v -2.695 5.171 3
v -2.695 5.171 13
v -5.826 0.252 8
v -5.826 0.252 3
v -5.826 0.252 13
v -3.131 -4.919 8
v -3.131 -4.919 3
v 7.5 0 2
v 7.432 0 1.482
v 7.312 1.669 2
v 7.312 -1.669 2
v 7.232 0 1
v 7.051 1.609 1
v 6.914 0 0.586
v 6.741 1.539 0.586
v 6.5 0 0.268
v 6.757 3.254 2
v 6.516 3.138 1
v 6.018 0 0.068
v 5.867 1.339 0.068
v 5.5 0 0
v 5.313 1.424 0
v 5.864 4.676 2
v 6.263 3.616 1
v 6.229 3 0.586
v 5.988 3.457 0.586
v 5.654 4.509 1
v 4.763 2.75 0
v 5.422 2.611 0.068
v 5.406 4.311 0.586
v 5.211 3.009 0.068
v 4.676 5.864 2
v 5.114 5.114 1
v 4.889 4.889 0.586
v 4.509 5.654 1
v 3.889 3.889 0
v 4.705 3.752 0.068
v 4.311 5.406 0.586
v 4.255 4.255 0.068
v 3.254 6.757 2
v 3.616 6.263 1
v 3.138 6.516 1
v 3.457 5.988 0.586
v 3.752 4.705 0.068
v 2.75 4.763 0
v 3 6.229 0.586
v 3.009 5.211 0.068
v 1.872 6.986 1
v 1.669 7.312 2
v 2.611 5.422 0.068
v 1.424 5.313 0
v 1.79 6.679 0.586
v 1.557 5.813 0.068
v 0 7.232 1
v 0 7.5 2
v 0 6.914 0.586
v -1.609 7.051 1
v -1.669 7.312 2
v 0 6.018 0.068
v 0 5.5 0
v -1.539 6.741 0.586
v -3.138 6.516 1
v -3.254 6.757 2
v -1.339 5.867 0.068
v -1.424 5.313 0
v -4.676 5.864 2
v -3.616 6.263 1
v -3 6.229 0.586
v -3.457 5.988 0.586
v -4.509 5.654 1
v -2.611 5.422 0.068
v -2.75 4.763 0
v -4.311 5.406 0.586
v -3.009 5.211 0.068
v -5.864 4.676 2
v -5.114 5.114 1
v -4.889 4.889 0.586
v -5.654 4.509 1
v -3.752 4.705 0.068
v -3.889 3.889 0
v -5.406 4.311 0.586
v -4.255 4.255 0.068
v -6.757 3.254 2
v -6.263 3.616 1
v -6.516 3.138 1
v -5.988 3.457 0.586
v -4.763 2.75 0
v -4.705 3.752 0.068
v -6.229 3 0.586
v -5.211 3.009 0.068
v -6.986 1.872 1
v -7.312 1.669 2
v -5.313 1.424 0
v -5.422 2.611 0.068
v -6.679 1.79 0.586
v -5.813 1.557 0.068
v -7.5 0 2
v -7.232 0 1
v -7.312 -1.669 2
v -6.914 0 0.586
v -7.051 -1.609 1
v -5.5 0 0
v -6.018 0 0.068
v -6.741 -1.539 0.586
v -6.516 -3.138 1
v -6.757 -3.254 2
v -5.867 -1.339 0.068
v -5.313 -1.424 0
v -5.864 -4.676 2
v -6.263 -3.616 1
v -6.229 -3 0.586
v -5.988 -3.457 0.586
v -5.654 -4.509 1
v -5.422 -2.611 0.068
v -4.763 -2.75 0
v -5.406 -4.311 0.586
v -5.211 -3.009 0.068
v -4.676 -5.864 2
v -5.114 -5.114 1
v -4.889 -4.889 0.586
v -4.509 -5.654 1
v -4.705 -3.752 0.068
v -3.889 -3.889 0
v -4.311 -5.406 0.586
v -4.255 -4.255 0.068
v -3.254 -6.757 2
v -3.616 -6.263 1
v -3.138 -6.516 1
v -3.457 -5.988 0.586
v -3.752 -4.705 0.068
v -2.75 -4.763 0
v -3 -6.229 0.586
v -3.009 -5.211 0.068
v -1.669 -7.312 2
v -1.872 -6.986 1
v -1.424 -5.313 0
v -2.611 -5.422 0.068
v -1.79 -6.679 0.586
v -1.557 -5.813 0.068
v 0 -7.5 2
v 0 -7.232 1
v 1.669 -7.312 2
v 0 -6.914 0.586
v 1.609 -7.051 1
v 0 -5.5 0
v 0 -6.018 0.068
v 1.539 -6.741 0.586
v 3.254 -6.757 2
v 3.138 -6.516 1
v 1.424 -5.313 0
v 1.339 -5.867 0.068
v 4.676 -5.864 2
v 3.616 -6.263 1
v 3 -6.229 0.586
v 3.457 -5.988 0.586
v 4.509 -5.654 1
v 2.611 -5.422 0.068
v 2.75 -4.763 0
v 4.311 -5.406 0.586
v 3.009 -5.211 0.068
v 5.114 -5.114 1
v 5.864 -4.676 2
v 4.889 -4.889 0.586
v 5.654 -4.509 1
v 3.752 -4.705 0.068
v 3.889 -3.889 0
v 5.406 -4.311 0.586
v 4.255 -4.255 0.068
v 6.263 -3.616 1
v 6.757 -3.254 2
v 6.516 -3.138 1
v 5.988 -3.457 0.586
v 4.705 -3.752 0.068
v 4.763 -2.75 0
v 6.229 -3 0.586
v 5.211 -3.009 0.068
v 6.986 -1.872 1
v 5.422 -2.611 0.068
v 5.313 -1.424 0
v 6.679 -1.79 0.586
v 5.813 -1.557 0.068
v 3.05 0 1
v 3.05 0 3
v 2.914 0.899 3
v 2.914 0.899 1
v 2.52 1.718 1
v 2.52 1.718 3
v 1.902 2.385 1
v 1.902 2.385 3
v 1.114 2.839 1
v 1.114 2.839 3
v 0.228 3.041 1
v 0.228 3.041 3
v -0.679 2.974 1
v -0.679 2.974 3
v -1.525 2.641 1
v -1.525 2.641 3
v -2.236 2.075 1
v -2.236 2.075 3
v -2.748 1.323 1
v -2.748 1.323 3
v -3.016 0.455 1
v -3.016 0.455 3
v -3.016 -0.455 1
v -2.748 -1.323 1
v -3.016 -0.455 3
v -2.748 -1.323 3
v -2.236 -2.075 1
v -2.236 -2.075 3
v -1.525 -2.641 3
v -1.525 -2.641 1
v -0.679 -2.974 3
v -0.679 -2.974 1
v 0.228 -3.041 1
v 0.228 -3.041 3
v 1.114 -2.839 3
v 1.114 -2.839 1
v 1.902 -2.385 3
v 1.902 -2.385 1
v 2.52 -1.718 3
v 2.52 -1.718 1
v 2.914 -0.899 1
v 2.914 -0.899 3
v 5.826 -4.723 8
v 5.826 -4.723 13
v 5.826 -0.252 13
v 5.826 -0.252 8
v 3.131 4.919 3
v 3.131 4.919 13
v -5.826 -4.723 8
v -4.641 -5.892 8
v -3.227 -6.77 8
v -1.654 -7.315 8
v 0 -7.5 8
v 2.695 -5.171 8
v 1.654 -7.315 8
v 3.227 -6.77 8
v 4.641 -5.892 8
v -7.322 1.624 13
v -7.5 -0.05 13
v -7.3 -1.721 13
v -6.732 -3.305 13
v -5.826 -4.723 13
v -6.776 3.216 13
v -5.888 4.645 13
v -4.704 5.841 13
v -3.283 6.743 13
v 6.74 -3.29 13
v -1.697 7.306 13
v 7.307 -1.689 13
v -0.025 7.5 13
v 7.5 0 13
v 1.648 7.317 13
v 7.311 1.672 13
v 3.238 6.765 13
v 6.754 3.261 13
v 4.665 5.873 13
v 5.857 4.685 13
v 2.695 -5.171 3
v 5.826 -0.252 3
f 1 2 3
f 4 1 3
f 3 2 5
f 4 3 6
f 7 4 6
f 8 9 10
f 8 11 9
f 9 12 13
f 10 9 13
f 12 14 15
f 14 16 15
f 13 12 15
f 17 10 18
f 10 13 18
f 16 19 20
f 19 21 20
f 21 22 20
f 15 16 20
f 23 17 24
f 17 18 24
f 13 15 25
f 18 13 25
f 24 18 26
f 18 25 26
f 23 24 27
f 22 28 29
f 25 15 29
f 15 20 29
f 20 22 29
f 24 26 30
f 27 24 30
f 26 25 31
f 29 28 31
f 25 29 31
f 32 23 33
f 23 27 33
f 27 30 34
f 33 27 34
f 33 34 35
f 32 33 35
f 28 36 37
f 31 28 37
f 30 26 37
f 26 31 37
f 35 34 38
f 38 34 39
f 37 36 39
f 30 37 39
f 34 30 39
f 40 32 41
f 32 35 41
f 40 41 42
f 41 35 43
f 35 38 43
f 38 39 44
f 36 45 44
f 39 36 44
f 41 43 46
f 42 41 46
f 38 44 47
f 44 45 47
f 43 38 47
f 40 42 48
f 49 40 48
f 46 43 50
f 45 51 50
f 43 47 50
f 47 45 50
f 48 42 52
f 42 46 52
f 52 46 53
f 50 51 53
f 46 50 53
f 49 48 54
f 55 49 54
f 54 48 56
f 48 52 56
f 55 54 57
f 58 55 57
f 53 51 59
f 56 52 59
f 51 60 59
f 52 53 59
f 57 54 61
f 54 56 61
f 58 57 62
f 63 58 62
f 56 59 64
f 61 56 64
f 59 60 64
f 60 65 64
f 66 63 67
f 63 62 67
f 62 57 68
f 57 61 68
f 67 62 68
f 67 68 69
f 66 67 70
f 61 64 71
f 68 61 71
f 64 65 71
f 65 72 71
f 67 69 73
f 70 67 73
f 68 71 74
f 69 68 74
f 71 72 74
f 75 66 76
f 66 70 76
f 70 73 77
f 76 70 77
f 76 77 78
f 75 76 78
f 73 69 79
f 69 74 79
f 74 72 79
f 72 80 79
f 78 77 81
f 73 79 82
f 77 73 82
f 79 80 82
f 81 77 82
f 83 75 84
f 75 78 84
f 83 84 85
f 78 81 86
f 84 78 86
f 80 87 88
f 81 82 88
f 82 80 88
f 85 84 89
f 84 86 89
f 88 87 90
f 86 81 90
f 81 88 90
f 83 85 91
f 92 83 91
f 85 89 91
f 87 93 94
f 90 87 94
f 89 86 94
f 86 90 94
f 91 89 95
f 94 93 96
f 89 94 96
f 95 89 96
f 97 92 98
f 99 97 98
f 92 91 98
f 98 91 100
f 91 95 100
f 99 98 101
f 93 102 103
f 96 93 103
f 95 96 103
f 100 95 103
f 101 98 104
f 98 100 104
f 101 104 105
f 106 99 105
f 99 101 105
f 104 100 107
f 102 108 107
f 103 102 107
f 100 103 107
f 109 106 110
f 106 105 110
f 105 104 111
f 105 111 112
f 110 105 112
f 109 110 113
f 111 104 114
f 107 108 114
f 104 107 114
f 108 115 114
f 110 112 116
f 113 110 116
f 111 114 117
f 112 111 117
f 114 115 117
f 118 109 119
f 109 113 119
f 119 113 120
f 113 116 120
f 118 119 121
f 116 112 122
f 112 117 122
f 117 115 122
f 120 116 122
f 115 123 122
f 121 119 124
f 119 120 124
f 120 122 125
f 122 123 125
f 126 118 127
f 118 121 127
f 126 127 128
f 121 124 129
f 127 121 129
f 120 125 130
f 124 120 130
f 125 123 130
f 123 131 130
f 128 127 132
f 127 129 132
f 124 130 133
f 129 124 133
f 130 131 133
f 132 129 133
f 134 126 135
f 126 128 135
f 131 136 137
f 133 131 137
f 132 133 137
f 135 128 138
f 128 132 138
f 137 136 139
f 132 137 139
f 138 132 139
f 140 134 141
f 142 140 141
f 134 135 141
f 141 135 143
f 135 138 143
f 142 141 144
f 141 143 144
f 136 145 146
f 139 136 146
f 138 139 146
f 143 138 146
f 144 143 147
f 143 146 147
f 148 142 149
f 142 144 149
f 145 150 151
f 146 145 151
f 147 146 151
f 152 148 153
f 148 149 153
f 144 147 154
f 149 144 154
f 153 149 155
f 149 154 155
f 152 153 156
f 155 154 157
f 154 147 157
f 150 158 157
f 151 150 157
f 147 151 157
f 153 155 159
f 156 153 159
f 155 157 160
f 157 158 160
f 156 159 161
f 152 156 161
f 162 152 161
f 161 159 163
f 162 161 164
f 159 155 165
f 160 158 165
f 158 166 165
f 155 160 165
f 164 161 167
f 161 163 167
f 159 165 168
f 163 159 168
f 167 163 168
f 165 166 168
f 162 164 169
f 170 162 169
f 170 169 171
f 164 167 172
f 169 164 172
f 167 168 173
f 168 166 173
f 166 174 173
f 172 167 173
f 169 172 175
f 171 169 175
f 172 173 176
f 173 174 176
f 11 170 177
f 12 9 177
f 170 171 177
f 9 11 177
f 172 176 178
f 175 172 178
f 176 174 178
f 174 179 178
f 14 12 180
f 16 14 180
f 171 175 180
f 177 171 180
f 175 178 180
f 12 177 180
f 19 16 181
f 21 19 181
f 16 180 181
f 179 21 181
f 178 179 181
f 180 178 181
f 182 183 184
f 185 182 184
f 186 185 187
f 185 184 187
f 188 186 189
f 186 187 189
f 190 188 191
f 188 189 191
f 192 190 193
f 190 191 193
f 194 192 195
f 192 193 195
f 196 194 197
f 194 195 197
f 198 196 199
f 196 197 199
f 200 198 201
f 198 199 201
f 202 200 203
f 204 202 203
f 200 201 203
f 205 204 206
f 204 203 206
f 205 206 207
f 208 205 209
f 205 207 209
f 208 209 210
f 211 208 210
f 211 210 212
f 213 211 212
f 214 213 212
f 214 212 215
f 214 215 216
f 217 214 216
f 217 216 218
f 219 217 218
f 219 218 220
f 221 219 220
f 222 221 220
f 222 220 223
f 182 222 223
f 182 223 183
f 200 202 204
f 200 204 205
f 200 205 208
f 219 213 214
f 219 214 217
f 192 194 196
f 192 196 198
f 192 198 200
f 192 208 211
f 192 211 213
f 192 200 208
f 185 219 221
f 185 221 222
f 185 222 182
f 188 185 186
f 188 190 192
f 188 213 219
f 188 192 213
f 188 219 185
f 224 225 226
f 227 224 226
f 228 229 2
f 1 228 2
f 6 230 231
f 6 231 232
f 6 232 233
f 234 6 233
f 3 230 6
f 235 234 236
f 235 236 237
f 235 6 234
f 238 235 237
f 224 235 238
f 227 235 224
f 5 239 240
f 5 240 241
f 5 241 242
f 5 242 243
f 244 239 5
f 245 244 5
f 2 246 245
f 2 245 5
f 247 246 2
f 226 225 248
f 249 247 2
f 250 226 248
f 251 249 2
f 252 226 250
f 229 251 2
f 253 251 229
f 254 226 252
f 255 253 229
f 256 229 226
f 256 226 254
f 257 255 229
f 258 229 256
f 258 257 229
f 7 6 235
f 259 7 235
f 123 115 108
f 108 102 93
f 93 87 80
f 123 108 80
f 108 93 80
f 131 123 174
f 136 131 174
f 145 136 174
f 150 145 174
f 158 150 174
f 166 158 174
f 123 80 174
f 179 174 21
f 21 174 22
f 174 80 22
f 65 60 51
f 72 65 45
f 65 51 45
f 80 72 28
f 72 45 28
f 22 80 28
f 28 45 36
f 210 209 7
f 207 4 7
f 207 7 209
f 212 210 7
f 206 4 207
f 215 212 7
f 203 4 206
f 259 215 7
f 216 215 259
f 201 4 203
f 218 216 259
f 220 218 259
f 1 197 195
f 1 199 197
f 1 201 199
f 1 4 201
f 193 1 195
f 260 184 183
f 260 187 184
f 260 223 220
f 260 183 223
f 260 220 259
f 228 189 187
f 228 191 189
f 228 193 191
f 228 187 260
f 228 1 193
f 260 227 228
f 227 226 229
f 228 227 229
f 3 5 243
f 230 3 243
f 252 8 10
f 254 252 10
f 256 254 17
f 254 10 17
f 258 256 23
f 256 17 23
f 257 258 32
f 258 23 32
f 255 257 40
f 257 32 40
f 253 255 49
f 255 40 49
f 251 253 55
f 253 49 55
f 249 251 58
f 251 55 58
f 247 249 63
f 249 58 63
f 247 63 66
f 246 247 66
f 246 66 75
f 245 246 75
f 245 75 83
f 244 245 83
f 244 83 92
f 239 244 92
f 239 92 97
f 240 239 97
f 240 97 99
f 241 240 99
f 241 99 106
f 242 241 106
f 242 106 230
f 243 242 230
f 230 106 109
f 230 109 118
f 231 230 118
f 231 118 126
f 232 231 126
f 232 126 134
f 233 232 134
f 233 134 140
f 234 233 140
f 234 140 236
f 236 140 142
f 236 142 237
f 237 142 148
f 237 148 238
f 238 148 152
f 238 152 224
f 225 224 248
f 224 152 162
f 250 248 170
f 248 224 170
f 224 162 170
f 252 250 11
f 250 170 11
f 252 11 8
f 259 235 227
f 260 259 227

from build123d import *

# Parameters (mm, degrees)
F0_R     = 7.5
F1_DEPTH = 13
F2_R     = 3.05
F3_DEPTH = 12
F5_R     = 3.05
F6_DEPTH = 10
F8_DEPTH = 5
F9_R     = 2


with BuildPart() as f1:
    # F0 (on Top) → F1 (new body)
    with BuildSketch(Plane.XY):
        Circle(F0_R)
    extrude(amount=F1_DEPTH)

    # F2 (on face) → F3 (cut)
    with BuildSketch(Plane.XY.offset(13)):
        Circle(F2_R)
    extrude(amount=-F3_DEPTH, mode=Mode.SUBTRACT)

    # F5 (on face) → F6 (cut)
    with BuildSketch(Plane.XY.offset(13)):
        Polygon((5.8257949863, -0.2518851143), (3.1310364009, 4.9193438983), (-2.6947585854, 5.1712290125), (-5.8257949863, 0.2518851143), (-3.1310364009, -4.9193438983), (2.6947585854, -5.1712290125), align=None)
        Circle(F5_R, mode=Mode.SUBTRACT)
    extrude(amount=-F6_DEPTH, mode=Mode.SUBTRACT)

    # F7 (on face) → F8 (cut)
    with BuildSketch(Plane.XY.offset(13)):
        with BuildLine():
            Line((-3.1310364009, -4.9193438983), (-5.8257949863, 0.2518851143))
            Line((-5.8257949863, 0.2518851143), (-5.8257949863, -4.7233582097))
            ThreePointArc((-5.8257949863, -4.7233582097), (0, -7.5), (5.8257949863, -4.7233582097))
            Line((5.8257949863, -4.7233582097), (5.8257949863, -0.2518851143))
            Line((5.8257949863, -0.2518851143), (2.6947585854, -5.1712290125))
            Line((2.6947585854, -5.1712290125), (-3.1310364009, -4.9193438983))
        make_face()
    extrude(amount=-F8_DEPTH, mode=Mode.SUBTRACT)

    # F9
    f9_edges = [f1.edges().sort_by_distance(p)[0] for p in [
        (-7.5, 0, 0),
    ]]
    fillet(f9_edges, radius=F9_R)


solid = f1.part
